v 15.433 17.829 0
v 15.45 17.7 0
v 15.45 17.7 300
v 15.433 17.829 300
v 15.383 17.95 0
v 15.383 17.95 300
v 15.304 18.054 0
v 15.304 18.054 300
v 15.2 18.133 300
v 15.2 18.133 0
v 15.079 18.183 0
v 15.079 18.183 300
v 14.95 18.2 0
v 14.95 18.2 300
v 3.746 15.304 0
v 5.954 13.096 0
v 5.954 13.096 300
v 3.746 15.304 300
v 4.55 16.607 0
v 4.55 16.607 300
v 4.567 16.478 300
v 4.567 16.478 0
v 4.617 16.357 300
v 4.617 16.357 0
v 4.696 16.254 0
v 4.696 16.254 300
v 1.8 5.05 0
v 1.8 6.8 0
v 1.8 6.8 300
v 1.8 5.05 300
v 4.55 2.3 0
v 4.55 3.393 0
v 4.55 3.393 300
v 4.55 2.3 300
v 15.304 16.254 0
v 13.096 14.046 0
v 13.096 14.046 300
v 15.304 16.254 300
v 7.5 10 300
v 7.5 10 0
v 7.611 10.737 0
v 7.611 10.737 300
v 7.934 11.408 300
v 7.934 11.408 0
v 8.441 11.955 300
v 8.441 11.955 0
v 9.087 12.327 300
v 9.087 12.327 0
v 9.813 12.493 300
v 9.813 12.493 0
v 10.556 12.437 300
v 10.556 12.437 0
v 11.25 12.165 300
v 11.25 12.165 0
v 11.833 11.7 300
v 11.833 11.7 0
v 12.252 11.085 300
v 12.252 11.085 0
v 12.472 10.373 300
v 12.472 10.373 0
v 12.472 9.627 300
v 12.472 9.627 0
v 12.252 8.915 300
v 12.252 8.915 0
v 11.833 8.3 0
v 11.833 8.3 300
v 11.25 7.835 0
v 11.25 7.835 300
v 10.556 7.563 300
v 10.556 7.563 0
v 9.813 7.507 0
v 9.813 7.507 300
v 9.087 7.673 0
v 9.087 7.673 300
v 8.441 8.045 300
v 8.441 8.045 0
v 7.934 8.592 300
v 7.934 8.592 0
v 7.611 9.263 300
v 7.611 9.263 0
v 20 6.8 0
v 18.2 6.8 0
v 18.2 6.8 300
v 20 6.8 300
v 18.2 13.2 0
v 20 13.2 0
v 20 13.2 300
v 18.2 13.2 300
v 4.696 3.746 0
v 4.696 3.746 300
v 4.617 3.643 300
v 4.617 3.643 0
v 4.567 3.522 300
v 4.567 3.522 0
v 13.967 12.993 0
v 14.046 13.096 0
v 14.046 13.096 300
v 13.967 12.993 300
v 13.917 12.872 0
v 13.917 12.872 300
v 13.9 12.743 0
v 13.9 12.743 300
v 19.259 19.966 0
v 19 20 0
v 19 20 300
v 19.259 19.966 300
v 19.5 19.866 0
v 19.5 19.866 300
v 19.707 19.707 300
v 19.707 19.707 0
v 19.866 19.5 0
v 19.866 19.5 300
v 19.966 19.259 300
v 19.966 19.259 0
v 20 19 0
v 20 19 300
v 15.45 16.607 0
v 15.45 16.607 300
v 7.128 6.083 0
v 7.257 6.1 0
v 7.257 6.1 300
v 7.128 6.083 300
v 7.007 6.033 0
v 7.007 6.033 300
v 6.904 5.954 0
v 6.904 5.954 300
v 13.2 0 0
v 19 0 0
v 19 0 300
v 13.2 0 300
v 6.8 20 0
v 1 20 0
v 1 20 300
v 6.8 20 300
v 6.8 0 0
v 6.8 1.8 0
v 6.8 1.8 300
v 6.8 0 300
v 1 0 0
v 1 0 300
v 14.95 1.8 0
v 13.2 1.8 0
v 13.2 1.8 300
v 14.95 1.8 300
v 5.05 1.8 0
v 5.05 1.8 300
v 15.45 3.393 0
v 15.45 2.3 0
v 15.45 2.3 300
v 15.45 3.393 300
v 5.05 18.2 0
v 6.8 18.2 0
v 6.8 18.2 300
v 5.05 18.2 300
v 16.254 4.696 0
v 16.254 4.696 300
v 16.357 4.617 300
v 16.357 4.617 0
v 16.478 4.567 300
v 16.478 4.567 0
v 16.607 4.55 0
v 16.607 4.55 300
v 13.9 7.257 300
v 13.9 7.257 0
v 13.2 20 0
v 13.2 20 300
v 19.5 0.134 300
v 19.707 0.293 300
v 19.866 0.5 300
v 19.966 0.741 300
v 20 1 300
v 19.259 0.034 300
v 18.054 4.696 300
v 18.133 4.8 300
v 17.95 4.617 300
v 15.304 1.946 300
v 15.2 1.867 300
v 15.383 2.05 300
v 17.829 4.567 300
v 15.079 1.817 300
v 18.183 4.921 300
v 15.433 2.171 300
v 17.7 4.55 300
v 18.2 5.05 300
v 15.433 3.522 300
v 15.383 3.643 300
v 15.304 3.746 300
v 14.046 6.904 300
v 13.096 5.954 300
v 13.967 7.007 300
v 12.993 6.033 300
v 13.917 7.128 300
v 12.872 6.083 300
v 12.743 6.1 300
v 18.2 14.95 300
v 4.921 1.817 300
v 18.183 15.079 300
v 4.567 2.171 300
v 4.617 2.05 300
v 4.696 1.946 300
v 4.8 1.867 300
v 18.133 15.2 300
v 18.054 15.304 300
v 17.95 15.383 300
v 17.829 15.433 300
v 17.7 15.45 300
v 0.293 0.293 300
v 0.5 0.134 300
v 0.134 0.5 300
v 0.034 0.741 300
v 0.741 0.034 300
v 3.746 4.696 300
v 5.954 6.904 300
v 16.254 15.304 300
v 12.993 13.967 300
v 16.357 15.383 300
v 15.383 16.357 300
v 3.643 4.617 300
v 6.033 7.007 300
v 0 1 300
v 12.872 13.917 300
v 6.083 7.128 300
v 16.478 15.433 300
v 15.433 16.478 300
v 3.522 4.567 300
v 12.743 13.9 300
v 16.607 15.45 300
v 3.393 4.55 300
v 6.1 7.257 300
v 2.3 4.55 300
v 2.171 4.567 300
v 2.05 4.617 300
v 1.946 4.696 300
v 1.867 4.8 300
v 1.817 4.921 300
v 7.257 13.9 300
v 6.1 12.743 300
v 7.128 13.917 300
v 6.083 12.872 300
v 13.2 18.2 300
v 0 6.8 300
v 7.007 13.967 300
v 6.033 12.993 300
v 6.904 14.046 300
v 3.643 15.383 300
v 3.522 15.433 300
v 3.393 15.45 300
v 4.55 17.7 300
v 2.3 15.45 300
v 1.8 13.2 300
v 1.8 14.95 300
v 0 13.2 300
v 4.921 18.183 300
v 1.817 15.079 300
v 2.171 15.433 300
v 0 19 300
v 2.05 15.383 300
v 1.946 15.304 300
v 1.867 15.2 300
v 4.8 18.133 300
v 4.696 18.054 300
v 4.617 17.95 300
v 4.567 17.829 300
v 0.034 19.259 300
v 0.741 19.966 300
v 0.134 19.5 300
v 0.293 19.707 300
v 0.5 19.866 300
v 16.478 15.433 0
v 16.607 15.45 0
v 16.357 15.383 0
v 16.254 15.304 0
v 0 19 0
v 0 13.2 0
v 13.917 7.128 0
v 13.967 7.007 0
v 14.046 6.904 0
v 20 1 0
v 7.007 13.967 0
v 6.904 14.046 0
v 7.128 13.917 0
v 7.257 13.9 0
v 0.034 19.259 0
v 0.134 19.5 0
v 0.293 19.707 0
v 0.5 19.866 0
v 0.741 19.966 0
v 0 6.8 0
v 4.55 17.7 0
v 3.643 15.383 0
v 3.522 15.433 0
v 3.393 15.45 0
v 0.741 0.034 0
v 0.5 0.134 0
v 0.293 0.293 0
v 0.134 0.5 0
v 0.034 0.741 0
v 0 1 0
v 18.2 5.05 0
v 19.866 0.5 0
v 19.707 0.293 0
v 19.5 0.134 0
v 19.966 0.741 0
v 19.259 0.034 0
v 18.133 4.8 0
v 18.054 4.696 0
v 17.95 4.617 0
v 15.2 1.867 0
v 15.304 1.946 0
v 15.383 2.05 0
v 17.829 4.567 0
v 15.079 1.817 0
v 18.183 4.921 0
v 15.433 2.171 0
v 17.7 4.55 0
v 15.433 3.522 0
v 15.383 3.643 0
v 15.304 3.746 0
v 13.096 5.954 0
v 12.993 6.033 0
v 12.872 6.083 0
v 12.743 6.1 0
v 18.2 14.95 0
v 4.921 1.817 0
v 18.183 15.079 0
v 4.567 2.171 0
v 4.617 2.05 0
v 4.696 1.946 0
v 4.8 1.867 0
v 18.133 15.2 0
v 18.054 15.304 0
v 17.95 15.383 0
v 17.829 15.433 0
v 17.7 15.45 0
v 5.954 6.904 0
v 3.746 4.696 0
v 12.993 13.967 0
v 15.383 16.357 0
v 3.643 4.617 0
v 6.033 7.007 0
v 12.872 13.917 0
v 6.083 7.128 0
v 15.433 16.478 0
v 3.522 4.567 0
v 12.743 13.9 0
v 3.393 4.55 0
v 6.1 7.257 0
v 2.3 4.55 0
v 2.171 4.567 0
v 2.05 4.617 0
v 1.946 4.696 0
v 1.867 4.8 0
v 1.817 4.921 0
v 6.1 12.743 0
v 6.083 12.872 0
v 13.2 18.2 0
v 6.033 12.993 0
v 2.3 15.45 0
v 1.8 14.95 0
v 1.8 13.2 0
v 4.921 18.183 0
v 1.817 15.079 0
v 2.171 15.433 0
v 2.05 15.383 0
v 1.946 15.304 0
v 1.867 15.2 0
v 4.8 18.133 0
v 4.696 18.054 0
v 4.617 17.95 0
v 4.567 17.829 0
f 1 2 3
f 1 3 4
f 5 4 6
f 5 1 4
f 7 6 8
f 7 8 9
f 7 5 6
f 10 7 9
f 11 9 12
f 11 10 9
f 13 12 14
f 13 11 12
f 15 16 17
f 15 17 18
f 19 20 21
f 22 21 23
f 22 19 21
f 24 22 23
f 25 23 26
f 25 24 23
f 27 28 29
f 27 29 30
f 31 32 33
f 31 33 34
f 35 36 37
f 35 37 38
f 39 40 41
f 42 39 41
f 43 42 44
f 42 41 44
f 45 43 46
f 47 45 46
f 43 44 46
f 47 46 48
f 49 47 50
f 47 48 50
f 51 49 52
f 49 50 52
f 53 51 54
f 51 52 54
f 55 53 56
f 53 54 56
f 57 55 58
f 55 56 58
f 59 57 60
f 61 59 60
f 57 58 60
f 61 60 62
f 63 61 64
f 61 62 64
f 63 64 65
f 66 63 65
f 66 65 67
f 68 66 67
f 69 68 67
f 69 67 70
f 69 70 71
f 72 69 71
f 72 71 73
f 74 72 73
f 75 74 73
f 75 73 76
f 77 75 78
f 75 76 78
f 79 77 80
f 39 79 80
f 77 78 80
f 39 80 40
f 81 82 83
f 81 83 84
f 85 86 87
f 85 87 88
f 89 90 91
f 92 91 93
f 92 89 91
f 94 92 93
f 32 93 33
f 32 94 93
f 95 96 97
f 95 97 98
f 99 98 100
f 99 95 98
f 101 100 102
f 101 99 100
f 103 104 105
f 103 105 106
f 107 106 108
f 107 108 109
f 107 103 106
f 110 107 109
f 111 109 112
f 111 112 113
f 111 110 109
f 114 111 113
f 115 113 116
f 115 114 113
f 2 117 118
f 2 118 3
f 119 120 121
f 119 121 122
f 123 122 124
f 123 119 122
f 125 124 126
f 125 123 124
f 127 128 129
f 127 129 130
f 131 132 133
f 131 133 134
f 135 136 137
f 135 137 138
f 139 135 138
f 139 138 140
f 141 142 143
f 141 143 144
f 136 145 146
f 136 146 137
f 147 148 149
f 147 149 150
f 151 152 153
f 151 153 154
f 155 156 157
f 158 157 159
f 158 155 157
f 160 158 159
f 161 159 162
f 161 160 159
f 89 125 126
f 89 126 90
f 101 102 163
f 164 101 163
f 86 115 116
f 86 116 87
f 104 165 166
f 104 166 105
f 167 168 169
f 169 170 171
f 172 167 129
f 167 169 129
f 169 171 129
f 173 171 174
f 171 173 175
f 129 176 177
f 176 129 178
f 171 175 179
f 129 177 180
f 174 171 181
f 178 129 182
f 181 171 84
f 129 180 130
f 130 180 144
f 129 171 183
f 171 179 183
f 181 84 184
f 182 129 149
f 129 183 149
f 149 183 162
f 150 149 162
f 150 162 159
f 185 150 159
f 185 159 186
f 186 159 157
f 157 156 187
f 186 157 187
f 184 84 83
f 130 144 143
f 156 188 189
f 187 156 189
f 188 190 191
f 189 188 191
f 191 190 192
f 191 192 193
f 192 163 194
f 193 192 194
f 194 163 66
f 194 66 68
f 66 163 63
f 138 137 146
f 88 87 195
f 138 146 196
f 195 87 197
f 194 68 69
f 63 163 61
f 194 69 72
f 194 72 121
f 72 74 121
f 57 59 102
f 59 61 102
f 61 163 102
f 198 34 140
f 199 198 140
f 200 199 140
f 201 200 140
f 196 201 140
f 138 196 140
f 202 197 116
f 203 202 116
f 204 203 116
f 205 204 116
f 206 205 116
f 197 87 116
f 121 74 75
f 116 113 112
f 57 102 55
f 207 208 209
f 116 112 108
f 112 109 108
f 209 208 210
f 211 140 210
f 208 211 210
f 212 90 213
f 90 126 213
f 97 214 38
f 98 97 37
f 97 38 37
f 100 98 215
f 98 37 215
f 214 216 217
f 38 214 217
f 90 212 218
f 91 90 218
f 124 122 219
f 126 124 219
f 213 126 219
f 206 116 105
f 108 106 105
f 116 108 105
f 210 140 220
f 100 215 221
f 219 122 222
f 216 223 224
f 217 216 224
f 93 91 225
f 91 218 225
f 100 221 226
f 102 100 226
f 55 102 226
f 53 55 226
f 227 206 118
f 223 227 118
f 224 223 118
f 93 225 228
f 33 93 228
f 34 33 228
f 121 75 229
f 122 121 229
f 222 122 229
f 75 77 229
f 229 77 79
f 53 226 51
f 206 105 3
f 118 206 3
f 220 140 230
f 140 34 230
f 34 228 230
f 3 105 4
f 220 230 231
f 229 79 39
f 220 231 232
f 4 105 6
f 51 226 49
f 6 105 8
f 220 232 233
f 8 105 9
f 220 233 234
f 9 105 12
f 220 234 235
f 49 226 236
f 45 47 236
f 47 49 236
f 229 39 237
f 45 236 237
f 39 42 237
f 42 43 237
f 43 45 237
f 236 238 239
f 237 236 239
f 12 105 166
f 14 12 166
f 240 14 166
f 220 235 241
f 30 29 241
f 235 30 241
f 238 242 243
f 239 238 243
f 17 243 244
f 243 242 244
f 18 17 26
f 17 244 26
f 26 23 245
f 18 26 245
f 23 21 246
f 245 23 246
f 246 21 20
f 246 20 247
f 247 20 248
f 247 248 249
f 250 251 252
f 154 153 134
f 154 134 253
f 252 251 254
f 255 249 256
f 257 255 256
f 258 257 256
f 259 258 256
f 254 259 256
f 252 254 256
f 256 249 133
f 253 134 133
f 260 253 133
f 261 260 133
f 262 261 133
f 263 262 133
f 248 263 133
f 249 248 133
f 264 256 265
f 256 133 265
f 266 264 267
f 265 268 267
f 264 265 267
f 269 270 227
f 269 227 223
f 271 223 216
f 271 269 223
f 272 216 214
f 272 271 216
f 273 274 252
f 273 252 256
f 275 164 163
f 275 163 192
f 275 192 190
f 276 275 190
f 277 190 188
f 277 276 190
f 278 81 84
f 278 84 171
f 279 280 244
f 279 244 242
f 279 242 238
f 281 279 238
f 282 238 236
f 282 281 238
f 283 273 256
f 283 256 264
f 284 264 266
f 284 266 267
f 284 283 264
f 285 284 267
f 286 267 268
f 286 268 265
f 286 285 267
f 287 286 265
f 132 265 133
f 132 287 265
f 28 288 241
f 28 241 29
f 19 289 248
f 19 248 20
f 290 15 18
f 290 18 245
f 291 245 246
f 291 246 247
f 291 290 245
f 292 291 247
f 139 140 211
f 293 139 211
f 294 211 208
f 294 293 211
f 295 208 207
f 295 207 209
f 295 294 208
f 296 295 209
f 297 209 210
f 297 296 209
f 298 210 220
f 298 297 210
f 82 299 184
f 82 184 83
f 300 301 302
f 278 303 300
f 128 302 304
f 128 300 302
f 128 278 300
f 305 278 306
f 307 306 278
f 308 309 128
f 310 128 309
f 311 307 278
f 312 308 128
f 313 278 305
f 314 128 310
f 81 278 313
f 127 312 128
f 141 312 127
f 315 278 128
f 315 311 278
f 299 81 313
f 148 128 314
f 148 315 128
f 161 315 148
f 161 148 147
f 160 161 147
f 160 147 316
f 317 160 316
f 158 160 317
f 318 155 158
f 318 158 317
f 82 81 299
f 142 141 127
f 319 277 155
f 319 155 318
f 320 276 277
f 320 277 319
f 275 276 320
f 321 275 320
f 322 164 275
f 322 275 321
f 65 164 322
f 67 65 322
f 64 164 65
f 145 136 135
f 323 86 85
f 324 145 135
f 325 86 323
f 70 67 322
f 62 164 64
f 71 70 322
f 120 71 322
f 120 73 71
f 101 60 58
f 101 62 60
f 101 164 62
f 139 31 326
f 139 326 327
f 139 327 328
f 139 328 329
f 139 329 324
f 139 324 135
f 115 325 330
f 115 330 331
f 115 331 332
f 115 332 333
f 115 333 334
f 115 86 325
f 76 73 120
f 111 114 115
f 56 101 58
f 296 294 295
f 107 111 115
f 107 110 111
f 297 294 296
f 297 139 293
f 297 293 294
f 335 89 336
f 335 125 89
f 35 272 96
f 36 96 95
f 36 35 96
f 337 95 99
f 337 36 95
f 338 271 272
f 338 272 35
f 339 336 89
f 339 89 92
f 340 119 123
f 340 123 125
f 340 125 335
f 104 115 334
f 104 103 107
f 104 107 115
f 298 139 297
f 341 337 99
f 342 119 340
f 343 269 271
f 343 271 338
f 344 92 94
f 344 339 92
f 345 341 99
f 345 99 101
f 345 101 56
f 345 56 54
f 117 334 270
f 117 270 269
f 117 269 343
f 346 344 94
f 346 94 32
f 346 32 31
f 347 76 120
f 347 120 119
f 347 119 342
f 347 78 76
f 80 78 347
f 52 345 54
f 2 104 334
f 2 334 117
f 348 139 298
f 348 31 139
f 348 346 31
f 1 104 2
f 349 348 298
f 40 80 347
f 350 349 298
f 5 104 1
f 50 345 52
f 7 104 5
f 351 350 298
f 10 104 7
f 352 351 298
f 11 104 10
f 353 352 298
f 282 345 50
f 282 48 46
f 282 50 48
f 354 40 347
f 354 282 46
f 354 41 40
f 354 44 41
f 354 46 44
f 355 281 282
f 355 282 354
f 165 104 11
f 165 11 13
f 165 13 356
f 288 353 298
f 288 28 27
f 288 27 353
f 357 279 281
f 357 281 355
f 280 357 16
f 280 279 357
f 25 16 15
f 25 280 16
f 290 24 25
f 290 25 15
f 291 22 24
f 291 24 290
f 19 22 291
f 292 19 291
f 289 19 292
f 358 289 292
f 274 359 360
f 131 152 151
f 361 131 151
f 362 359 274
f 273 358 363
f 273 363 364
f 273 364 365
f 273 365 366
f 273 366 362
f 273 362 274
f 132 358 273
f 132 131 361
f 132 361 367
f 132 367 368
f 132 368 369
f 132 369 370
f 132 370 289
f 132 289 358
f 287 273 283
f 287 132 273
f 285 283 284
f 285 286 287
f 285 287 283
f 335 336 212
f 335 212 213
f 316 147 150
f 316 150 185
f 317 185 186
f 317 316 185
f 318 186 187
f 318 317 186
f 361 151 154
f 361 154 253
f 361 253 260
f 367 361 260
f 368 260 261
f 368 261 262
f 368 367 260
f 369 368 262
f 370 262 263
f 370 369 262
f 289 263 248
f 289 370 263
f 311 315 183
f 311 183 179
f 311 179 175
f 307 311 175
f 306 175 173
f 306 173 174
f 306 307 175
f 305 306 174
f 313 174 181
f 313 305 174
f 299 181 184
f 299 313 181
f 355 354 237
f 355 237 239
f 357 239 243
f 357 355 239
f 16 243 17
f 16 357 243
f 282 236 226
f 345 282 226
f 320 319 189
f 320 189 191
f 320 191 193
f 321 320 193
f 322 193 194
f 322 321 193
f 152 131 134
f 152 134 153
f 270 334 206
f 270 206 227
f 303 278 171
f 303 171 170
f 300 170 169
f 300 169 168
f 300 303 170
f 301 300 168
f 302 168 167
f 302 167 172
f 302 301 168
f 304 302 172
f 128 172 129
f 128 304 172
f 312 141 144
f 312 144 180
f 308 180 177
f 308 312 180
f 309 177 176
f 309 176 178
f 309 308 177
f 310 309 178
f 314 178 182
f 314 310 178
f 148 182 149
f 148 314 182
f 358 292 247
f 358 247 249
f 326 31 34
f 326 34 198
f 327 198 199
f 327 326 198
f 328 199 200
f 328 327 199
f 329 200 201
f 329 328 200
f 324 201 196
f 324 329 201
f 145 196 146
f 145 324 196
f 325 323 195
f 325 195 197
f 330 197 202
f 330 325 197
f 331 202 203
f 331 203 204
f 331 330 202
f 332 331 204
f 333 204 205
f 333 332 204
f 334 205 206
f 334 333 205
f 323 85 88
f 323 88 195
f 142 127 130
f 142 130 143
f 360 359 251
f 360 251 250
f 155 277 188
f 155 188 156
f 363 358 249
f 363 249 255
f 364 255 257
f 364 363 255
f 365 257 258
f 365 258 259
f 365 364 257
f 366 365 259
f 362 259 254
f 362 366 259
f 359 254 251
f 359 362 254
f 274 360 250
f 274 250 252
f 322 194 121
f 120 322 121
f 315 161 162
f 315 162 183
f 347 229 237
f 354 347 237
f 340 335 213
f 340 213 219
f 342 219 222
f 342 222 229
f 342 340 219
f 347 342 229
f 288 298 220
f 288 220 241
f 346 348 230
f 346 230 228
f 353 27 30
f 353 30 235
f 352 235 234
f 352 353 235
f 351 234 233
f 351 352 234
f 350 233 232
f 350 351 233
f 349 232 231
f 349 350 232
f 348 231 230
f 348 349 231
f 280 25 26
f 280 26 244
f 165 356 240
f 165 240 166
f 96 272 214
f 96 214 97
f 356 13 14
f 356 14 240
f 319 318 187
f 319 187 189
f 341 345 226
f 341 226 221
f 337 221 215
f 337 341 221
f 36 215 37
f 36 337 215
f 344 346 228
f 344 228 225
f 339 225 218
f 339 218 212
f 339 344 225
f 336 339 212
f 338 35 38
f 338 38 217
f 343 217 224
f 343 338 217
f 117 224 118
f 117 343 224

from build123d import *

# Parameters (mm, degrees)
SKETCH1_R           = 2.5
BOSS_EXTRUDE1_DEPTH = 300


with BuildPart() as part:
    # Sketch1 → Boss-Extrude1 (new body)
    with BuildSketch(Plane(origin=(0, 0, 0), x_dir=(-1, 0, 0), z_dir=(0, 0, -1))):
        with BuildLine():
            Line((-20, 19), (-20, 13.2))
            Line((-20, 13.2), (-18.2, 13.2))
            Line((-18.2, 13.2), (-18.2, 14.95))
            ThreePointArc((-18.2, 14.95), (-18.053553391, 15.303553391), (-17.7, 15.45))
            Line((-17.7, 15.45), (-16.607106781, 15.45))
            ThreePointArc((-16.607106781, 15.45), (-16.415765065, 15.411939766), (-16.253553391, 15.303553391))
            Line((-16.253553391, 15.303553391), (-14.046446609, 13.096446609))
            ThreePointArc((-14.046446609, 13.096446609), (-13.938060234, 12.934234935), (-13.9, 12.742893219))
            Line((-13.9, 12.742893219), (-13.9, 7.257106781))
            ThreePointArc((-13.9, 7.257106781), (-13.938060234, 7.065765065), (-14.046446609, 6.903553391))
            Line((-14.046446609, 6.903553391), (-16.253553391, 4.696446609))
            ThreePointArc((-16.253553391, 4.696446609), (-16.415765065, 4.588060234), (-16.607106781, 4.55))
            Line((-16.607106781, 4.55), (-17.7, 4.55))
            ThreePointArc((-17.7, 4.55), (-18.053553391, 4.696446609), (-18.2, 5.05))
            Line((-18.2, 5.05), (-18.2, 6.8))
            Line((-18.2, 6.8), (-20, 6.8))
            Line((-20, 6.8), (-20, 1))
            ThreePointArc((-20, 1), (-19.707106781, 0.292893219), (-19, 0))
            Line((-19, 0), (-13.2, 0))
            Line((-13.2, 0), (-13.2, 1.8))
            Line((-13.2, 1.8), (-14.95, 1.8))
            ThreePointArc((-14.95, 1.8), (-15.303553391, 1.946446609), (-15.45, 2.3))
            Line((-15.45, 2.3), (-15.45, 3.392893219))
            ThreePointArc((-15.45, 3.392893219), (-15.411939766, 3.584234935), (-15.303553391, 3.746446609))
            Line((-15.303553391, 3.746446609), (-13.096446609, 5.953553391))
            ThreePointArc((-13.096446609, 5.953553391), (-12.934234935, 6.061939766), (-12.742893219, 6.1))
            Line((-12.742893219, 6.1), (-7.257106781, 6.1))
            ThreePointArc((-7.257106781, 6.1), (-7.065765065, 6.061939766), (-6.903553391, 5.953553391))
            Line((-6.903553391, 5.953553391), (-4.696446609, 3.746446609))
            ThreePointArc((-4.696446609, 3.746446609), (-4.588060234, 3.584234935), (-4.55, 3.392893219))
            Line((-4.55, 3.392893219), (-4.55, 2.3))
            ThreePointArc((-4.55, 2.3), (-4.696446609, 1.946446609), (-5.05, 1.8))
            Line((-5.05, 1.8), (-6.8, 1.8))
            Line((-6.8, 1.8), (-6.8, 0))
            Line((-6.8, 0), (-1, 0))
            ThreePointArc((-1, 0), (-0.292893219, 0.292893219), (0, 1))
            Line((0, 1), (0, 6.8))
            Line((0, 6.8), (-1.8, 6.8))
            Line((-1.8, 6.8), (-1.8, 5.05))
            ThreePointArc((-1.8, 5.05), (-1.946446609, 4.696446609), (-2.3, 4.55))
            Line((-2.3, 4.55), (-3.392893219, 4.55))
            ThreePointArc((-3.392893219, 4.55), (-3.584234935, 4.588060234), (-3.746446609, 4.696446609))
            Line((-3.746446609, 4.696446609), (-5.953553391, 6.903553391))
            ThreePointArc((-5.953553391, 6.903553391), (-6.061939766, 7.065765065), (-6.1, 7.257106781))
            Line((-6.1, 7.257106781), (-6.1, 12.742893219))
            ThreePointArc((-6.1, 12.742893219), (-6.061939766, 12.934234935), (-5.953553391, 13.096446609))
            Line((-5.953553391, 13.096446609), (-3.746446609, 15.303553391))
            ThreePointArc((-3.746446609, 15.303553391), (-3.584234935, 15.411939766), (-3.392893219, 15.45))
            Line((-3.392893219, 15.45), (-2.3, 15.45))
            ThreePointArc((-2.3, 15.45), (-1.946446609, 15.303553391), (-1.8, 14.95))
            Line((-1.8, 14.95), (-1.8, 13.2))
            Line((-1.8, 13.2), (0, 13.2))
            Line((0, 13.2), (0, 19))
            ThreePointArc((0, 19), (-0.292893219, 19.707106781), (-1, 20))
            Line((-1, 20), (-6.8, 20))
            Line((-6.8, 20), (-6.8, 18.2))
            Line((-6.8, 18.2), (-5.05, 18.2))
            ThreePointArc((-5.05, 18.2), (-4.696446609, 18.053553391), (-4.55, 17.7))
            Line((-4.55, 17.7), (-4.55, 16.607106781))
            ThreePointArc((-4.55, 16.607106781), (-4.588060234, 16.415765065), (-4.696446609, 16.253553391))
            Line((-4.696446609, 16.253553391), (-6.903553391, 14.046446609))
            ThreePointArc((-6.903553391, 14.046446609), (-7.065765065, 13.938060234), (-7.257106781, 13.9))
            Line((-7.257106781, 13.9), (-12.742893219, 13.9))
            ThreePointArc((-12.742893219, 13.9), (-12.934234935, 13.938060234), (-13.096446609, 14.046446609))
            Line((-13.096446609, 14.046446609), (-15.303553391, 16.253553391))
            ThreePointArc((-15.303553391, 16.253553391), (-15.411939766, 16.415765065), (-15.45, 16.607106781))
            Line((-15.45, 16.607106781), (-15.45, 17.7))
            ThreePointArc((-15.45, 17.7), (-15.303553391, 18.053553391), (-14.95, 18.2))
            Line((-14.95, 18.2), (-13.2, 18.2))
            Line((-13.2, 18.2), (-13.2, 20))
            Line((-13.2, 20), (-19, 20))
            ThreePointArc((-19, 20), (-19.707106781, 19.707106781), (-20, 19))
        make_face()
        with Locations((-10, 10)):
            Circle(SKETCH1_R, mode=Mode.SUBTRACT)
    extrude(amount=-BOSS_EXTRUDE1_DEPTH)


solid = part.part
